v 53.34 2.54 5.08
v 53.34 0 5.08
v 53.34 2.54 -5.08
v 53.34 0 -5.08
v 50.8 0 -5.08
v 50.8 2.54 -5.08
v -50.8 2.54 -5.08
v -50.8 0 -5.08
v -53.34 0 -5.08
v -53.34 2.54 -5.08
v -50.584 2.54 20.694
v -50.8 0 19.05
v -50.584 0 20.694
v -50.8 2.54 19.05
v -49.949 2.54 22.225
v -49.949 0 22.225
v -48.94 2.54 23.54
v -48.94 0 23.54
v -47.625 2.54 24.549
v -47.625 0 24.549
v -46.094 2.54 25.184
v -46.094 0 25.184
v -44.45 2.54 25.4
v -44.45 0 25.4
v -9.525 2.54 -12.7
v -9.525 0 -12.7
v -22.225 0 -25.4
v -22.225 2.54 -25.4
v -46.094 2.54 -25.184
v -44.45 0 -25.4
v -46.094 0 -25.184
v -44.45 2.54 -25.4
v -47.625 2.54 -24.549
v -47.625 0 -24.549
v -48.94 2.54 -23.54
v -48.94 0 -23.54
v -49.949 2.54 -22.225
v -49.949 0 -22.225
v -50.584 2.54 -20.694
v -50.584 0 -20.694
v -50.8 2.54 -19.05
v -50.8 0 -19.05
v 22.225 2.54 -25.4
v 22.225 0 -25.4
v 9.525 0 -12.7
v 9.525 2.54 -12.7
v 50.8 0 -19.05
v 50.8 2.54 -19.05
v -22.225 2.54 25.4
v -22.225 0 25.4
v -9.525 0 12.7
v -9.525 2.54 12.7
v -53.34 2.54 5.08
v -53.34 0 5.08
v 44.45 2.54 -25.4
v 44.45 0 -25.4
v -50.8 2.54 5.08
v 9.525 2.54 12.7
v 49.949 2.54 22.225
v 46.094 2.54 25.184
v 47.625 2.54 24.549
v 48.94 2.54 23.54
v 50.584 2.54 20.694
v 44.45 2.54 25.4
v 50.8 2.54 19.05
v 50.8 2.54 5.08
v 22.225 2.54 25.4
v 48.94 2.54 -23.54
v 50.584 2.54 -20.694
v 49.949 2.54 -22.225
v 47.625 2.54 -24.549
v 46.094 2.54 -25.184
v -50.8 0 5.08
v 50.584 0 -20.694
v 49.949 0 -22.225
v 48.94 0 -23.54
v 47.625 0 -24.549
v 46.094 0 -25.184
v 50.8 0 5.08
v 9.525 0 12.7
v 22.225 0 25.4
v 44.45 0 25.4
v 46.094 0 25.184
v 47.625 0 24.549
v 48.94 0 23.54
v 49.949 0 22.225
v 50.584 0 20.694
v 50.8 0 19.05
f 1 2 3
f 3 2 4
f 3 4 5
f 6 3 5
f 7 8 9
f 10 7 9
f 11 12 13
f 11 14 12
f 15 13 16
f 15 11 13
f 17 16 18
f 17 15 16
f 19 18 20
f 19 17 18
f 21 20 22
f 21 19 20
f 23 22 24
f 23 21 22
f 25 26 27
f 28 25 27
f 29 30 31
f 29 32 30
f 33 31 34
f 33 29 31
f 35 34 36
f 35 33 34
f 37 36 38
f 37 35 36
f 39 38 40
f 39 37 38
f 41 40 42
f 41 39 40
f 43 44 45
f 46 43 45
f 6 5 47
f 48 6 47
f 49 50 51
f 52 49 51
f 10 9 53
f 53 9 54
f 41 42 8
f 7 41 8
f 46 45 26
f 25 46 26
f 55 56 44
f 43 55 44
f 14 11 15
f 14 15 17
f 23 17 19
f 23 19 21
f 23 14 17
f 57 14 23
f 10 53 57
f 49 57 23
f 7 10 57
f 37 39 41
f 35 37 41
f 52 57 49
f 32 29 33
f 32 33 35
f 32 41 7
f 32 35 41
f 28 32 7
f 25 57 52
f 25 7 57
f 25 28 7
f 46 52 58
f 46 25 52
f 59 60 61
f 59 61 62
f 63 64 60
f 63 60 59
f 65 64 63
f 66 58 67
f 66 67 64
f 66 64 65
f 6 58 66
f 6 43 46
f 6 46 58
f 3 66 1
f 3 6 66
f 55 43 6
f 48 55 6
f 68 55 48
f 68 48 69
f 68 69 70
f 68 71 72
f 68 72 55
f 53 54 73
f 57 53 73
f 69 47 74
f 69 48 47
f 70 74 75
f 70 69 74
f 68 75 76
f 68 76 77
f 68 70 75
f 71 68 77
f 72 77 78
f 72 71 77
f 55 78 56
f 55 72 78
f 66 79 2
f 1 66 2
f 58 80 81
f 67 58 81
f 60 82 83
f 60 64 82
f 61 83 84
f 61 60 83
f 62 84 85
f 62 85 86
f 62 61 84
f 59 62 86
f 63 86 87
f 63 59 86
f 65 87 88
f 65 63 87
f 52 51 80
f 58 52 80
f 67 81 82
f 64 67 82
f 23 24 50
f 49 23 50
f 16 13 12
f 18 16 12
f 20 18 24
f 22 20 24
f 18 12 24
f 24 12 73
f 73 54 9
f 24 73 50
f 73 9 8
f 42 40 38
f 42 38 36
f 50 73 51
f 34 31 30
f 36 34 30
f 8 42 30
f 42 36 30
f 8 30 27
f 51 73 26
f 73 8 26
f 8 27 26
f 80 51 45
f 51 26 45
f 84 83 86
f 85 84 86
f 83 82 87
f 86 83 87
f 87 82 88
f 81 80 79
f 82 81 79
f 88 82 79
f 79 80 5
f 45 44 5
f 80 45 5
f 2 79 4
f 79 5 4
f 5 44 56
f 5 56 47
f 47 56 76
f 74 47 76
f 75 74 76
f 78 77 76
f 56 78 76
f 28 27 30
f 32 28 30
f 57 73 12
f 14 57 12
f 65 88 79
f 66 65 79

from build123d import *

# Parameters (mm, degrees)
BOSS_EXTRUDE1_DEPTH = 2.54
FILLET1_R           = 6.35


with BuildPart() as part:
    # Sketch1 → Boss-Extrude1 (new body)
    with BuildSketch(Plane(origin=(0, 0, 0), x_dir=(1, 0, 0), z_dir=(0, 1, 0))):
        Polygon((-9.525, 12.7), (-22.225, 25.4), (-50.8, 25.4), (-50.8, 5.08), (-53.34, 5.08), (-53.34, -5.08), (-50.8, -5.08), (-50.8, -25.4), (-22.225, -25.4), (-9.525, -12.7), (9.525, -12.7), (22.225, -25.4), (50.8, -25.4), (50.8, -5.08), (53.34, -5.08), (53.34, 5.08), (50.8, 5.08), (50.8, 25.4), (22.225, 25.4), (9.525, 12.7), align=None)
    extrude(amount=BOSS_EXTRUDE1_DEPTH)

    # Fillet1
    fillet1_edges = [part.edges().sort_by_distance(p)[0] for p in [
        (50.8, 1.27, -25.4),
        (50.8, 1.27, 25.4),
        (-50.8, 1.27, 25.4),
        (-50.8, 1.27, -25.4),
    ]]
    fillet(fillet1_edges, radius=FILLET1_R)


solid = part.part
